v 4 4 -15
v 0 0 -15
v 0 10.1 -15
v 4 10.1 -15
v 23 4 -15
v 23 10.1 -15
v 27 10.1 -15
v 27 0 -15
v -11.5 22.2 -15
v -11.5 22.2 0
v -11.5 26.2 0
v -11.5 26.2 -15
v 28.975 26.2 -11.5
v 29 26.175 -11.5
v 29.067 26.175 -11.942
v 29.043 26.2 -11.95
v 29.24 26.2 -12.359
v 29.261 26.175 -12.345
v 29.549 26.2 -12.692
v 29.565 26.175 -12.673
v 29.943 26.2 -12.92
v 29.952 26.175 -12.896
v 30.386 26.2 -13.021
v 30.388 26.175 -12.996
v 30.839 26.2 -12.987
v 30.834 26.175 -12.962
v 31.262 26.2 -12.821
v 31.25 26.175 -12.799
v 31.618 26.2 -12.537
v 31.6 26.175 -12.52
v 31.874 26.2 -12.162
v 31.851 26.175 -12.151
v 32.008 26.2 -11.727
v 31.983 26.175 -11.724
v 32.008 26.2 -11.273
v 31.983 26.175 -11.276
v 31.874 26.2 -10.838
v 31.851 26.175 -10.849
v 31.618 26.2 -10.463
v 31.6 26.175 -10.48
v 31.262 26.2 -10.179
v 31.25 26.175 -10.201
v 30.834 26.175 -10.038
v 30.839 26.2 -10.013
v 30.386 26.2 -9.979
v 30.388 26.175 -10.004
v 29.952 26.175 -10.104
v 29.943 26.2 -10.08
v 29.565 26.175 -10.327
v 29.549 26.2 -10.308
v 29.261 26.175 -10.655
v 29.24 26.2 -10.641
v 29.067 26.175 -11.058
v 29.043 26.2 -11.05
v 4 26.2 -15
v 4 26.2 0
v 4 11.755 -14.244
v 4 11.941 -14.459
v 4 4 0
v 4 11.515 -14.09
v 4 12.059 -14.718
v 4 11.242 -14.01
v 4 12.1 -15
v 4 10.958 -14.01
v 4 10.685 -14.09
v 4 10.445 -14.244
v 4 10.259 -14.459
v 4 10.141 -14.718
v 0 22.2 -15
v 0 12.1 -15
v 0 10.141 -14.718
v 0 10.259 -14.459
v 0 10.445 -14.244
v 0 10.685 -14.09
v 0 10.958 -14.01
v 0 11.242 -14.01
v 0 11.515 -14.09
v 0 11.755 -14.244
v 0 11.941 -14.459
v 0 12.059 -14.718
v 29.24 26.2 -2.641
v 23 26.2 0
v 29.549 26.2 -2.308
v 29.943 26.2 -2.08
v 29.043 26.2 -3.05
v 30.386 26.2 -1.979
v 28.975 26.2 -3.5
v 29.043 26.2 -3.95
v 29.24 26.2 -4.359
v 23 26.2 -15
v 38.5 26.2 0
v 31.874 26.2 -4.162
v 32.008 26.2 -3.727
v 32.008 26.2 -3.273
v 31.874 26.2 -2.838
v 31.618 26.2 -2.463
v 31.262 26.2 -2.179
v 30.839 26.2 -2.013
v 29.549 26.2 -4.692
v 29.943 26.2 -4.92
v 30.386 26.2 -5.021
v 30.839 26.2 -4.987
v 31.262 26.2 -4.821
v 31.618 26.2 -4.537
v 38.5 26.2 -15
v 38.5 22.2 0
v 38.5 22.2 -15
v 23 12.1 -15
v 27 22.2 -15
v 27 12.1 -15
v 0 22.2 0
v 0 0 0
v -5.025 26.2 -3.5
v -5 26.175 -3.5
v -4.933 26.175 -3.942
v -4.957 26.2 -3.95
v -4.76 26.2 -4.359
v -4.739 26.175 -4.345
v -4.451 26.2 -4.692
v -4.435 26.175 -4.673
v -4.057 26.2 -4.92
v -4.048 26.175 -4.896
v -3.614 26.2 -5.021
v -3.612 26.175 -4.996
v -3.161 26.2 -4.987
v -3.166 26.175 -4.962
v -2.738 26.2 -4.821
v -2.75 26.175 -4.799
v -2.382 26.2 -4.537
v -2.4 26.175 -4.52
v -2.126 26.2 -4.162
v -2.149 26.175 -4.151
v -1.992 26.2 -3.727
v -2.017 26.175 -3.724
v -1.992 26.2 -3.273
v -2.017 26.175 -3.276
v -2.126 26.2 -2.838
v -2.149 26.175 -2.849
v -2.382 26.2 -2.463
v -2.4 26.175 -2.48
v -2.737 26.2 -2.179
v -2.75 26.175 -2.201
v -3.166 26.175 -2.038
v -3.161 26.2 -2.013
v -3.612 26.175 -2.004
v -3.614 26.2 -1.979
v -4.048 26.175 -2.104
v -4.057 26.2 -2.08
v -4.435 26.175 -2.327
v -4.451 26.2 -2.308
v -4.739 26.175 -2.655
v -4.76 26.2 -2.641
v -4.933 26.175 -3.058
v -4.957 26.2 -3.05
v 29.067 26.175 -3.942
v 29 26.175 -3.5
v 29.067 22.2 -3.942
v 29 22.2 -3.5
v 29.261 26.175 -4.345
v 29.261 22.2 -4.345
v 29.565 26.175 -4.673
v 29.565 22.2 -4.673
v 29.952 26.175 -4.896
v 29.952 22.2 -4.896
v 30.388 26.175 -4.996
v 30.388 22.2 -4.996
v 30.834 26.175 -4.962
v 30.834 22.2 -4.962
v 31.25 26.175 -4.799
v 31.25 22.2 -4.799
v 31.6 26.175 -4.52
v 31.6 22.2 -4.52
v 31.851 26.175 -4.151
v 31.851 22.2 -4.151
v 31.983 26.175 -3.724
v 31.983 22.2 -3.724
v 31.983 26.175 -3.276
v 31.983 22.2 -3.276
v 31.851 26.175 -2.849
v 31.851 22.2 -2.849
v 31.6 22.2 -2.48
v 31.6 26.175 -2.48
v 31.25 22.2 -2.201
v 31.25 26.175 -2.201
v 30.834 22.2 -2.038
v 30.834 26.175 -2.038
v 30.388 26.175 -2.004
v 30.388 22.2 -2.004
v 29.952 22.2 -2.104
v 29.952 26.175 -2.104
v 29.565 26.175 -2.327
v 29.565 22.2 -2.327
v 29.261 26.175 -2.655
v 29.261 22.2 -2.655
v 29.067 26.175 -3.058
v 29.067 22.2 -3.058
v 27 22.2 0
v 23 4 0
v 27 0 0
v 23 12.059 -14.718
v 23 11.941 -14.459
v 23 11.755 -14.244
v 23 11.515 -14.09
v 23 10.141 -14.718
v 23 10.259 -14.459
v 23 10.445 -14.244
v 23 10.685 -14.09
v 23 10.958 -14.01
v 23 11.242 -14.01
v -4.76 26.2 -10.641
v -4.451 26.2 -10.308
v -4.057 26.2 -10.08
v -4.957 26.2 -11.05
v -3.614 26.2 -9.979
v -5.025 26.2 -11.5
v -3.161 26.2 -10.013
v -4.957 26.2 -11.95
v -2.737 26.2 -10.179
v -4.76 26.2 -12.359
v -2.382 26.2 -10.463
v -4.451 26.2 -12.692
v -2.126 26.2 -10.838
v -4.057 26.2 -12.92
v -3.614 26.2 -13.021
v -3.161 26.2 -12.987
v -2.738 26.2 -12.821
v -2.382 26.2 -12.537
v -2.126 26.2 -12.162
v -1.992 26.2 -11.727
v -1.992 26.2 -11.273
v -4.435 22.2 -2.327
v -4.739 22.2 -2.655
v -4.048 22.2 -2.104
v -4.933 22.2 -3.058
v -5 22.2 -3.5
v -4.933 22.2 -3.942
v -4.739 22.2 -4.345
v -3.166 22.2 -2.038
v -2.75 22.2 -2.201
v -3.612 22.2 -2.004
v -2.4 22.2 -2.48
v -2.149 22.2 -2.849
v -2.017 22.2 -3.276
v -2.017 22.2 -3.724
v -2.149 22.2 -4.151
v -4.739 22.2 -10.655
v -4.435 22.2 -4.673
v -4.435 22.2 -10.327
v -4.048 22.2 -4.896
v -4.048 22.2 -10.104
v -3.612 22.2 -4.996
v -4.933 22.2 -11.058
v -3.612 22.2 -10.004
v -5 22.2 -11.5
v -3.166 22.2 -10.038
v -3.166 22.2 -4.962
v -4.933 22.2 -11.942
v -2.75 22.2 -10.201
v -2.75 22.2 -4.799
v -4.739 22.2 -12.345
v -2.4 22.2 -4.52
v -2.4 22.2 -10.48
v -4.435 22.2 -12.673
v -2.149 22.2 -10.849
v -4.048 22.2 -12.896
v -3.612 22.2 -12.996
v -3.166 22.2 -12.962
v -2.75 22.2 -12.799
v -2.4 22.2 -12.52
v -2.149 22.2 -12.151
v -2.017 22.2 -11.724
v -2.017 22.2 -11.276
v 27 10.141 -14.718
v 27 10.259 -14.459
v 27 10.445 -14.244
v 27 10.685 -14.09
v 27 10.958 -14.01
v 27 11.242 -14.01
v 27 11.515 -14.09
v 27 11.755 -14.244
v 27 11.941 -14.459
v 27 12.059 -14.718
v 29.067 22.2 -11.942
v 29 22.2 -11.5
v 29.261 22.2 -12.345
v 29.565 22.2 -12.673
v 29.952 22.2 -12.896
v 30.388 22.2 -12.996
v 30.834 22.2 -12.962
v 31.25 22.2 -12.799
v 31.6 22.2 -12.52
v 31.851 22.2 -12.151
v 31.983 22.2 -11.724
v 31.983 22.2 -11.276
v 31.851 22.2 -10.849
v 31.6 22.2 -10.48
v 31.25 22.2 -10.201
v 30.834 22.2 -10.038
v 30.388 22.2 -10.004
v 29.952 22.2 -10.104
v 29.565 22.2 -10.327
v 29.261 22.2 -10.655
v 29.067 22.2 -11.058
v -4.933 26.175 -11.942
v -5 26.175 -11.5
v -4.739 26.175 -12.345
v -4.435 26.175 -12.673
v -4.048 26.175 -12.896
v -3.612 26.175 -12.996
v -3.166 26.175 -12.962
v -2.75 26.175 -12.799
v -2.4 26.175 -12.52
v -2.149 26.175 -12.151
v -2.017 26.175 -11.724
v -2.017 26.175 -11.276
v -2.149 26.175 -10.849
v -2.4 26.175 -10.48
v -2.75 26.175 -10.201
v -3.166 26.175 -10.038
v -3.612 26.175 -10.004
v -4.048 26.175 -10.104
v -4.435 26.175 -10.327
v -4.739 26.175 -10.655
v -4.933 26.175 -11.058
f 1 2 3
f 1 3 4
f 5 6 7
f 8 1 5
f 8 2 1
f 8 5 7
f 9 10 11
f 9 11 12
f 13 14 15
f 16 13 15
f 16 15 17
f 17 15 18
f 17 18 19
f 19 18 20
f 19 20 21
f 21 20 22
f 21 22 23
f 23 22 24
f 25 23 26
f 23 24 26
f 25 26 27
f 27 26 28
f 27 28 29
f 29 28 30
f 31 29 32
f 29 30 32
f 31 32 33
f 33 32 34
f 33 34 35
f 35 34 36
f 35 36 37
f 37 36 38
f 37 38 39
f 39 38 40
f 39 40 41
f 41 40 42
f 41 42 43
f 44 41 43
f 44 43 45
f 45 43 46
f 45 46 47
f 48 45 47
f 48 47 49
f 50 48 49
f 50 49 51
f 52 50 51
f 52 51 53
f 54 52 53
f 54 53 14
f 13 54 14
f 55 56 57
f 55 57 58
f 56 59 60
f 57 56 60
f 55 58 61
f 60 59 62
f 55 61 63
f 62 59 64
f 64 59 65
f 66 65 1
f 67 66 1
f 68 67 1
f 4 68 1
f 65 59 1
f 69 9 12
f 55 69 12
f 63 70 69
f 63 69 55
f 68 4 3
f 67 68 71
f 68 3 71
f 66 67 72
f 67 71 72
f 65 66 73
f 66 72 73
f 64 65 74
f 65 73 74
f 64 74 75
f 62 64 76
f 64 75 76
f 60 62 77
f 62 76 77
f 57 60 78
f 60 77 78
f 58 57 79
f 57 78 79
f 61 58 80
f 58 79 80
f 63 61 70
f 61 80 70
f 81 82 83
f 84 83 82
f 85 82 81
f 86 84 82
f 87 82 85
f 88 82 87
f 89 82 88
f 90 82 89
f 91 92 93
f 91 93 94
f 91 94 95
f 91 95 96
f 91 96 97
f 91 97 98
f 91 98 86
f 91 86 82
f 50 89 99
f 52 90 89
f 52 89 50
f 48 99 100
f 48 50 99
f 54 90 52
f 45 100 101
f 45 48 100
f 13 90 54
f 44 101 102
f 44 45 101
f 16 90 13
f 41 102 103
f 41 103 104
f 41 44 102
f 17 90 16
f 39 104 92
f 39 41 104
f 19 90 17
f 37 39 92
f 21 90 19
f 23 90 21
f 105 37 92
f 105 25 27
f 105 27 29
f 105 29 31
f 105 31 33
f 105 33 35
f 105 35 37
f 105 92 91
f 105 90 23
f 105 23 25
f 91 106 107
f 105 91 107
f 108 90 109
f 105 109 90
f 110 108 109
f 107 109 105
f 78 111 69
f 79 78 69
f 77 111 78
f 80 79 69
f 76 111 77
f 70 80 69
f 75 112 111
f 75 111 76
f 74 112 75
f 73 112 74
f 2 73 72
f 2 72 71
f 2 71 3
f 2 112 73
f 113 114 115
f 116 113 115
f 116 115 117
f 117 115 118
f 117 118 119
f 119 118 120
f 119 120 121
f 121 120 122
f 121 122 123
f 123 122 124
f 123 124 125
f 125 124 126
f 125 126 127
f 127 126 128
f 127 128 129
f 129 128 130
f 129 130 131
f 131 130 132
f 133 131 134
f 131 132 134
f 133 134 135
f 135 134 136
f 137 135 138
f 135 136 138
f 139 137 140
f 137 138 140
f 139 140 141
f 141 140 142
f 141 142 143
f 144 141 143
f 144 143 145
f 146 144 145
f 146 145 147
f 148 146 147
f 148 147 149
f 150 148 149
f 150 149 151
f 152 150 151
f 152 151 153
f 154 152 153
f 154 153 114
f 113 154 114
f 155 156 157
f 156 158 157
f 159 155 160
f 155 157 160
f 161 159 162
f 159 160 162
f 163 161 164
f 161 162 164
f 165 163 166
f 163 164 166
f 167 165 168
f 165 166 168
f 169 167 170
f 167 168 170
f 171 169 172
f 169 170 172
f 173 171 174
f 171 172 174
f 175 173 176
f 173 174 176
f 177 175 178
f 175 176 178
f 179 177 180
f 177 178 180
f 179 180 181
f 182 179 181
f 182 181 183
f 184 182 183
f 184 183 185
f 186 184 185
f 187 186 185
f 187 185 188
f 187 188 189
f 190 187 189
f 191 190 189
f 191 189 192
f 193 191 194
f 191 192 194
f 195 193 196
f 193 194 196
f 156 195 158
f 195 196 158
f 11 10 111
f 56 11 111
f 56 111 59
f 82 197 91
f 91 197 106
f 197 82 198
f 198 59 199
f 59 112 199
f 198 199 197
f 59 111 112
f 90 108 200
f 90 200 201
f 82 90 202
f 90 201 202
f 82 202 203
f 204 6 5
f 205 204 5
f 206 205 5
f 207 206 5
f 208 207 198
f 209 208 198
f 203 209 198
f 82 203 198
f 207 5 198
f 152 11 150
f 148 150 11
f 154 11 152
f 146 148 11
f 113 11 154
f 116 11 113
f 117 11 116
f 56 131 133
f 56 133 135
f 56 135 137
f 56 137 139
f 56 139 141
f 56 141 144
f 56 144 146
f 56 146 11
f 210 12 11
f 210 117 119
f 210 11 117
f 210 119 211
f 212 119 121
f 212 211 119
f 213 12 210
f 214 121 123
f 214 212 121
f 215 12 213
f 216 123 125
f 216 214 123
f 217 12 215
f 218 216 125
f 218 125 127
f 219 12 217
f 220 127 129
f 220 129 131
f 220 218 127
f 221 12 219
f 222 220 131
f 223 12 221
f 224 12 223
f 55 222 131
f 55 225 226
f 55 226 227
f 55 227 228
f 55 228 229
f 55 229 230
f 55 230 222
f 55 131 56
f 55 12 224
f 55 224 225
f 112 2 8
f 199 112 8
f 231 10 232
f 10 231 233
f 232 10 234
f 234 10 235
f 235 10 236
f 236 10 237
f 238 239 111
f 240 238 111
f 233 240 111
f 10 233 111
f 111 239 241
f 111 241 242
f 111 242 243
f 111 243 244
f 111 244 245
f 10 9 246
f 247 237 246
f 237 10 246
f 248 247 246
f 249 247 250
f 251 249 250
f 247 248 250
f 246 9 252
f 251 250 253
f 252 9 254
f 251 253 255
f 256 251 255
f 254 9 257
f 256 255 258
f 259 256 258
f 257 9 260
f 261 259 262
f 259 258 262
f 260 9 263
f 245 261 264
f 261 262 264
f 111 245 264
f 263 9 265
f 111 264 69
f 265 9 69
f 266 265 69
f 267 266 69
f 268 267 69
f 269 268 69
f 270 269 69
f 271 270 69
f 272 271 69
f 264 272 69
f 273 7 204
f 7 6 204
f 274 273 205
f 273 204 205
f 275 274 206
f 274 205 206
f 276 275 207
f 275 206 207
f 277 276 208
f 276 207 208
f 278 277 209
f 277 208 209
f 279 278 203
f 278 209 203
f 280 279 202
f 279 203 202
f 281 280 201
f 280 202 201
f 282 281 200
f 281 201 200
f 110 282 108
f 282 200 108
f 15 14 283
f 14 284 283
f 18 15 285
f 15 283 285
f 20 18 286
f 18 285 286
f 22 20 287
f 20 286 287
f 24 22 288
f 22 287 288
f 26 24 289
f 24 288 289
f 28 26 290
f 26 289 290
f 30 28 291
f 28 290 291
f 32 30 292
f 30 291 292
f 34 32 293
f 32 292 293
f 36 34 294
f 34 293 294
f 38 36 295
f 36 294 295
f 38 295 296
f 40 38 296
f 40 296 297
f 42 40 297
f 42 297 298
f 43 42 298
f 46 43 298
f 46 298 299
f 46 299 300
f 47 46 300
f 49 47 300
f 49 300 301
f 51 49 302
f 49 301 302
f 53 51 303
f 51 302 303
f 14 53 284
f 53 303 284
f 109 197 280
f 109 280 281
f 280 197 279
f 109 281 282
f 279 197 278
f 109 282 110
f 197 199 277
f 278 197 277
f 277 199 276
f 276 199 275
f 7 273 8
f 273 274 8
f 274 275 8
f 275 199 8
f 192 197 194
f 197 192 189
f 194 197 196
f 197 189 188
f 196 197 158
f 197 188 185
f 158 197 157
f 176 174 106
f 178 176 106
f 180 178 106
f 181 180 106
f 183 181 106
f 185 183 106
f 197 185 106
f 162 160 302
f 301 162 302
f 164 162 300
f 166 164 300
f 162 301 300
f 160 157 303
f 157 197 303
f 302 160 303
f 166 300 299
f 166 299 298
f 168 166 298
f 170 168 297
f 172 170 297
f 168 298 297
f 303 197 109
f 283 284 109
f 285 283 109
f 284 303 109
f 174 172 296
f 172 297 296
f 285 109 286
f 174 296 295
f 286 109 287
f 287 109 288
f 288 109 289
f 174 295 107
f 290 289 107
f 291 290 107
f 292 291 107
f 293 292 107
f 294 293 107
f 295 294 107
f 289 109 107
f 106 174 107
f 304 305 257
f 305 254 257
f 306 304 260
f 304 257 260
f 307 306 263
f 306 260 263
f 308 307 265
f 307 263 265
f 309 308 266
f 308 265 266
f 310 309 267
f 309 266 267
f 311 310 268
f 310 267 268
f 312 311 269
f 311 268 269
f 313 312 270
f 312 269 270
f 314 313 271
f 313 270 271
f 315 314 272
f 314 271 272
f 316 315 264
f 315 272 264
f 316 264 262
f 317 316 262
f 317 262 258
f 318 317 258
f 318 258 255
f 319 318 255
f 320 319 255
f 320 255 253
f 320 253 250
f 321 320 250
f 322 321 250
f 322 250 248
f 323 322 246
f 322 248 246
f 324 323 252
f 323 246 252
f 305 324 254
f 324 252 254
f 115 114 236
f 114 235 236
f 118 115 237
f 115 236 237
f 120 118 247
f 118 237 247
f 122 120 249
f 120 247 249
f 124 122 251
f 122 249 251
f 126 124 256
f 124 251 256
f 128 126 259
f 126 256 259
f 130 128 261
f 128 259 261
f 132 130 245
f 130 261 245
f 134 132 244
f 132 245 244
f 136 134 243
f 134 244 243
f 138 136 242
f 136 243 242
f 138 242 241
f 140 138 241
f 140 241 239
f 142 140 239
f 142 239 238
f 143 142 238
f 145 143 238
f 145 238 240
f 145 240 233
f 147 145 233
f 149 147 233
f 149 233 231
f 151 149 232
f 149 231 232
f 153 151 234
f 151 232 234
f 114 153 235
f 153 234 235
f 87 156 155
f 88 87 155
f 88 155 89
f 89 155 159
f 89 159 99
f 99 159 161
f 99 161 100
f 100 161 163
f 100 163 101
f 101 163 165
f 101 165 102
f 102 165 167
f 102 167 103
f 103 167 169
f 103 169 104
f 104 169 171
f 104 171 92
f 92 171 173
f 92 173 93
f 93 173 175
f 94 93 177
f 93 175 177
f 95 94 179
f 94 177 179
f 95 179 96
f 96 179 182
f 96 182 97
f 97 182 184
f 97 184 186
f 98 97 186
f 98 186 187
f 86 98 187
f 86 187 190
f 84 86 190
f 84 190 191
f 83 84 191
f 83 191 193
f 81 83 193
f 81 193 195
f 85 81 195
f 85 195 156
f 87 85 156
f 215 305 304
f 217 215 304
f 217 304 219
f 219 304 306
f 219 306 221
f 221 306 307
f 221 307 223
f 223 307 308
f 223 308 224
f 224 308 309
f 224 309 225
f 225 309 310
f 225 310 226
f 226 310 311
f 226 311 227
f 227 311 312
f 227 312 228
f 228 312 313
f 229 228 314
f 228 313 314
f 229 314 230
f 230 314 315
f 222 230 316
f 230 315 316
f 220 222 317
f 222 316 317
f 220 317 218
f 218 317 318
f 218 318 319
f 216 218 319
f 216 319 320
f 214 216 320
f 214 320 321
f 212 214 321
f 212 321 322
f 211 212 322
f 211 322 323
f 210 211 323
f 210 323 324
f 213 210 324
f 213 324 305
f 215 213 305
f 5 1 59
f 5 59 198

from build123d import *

# Parameters (mm, degrees)
SKETCH_2_W            = 27
SKETCH_2_H            = 15
EXTRUDE_1_DEPTH       = 22.2
SHELL_2_T             = -4
SKETCH_3_R            = 1
CUT_EXTRUDE_1_DEPTH   = 32.2
SKETCH_4_W            = 50
SKETCH_4_H            = 15
EXTRUDE_2_DEPTH       = 4
SKETCH_5_W            = 19
SKETCH_5_H            = 15
CUT_EXTRUDE_2_DEPTH   = 8
F_3_0MM_1_D           = 3
F_3_0MM_1_CSINK_D     = 3.05
F_3_0MM_1_CSINK_ANGLE = 90


with BuildPart() as part:
    # Sketch 2 → Extrude 1 (new body)
    with BuildSketch(Plane(origin=(0, 0, 0), x_dir=(1, 0, 0), z_dir=(0, 1, 0))):
        with Locations((13.5, 7.5)):
            Rectangle(SKETCH_2_W, SKETCH_2_H)
    extrude(amount=EXTRUDE_1_DEPTH)

    # Shell 2
    shell_2_openings = [part.faces().sort_by_distance(p)[0] for p in [
        (13.5, 22.2, -7.5),
        (13.5, 11.1, -15),
        (13.5, 11.1, 0),
    ]]
    offset(amount=SHELL_2_T, openings=shell_2_openings, kind=Kind.INTERSECTION)

    # Sketch 3 → Cut-Extrude 1 (cut)
    with BuildSketch(Plane.ZY):
        with Locations((-15, 11.1)):
            Circle(SKETCH_3_R)
    extrude(amount=-CUT_EXTRUDE_1_DEPTH, mode=Mode.SUBTRACT)

    # Sketch 4 → Extrude 2 (add)
    with BuildSketch(Plane(origin=(0, 22.2, 0), x_dir=(1, 0, 0), z_dir=(0, 1, 0))):
        with Locations((13.5, 7.5)):
            Rectangle(SKETCH_4_W, SKETCH_4_H)
    extrude(amount=EXTRUDE_2_DEPTH)

    # Sketch 5 → Cut-Extrude 2 (cut)
    with BuildSketch(Plane.XZ.offset(-22.2)):
        with Locations((13.5, -7.5)):
            Rectangle(SKETCH_5_W, SKETCH_5_H)
    extrude(amount=-CUT_EXTRUDE_2_DEPTH, mode=Mode.SUBTRACT)

    # 3.0mm _1 (through all)
    with Locations(Plane(origin=(0, 26.2, 0), x_dir=(1, 0, 0), z_dir=(0, 1, 0))):
        with Locations((-3.5, 11.5), (-3.5, 3.5), (30.5, 11.5), (30.5, 3.5)):
            CounterSinkHole(F_3_0MM_1_D / 2, F_3_0MM_1_CSINK_D / 2, counter_sink_angle=F_3_0MM_1_CSINK_ANGLE)


solid = part.part
